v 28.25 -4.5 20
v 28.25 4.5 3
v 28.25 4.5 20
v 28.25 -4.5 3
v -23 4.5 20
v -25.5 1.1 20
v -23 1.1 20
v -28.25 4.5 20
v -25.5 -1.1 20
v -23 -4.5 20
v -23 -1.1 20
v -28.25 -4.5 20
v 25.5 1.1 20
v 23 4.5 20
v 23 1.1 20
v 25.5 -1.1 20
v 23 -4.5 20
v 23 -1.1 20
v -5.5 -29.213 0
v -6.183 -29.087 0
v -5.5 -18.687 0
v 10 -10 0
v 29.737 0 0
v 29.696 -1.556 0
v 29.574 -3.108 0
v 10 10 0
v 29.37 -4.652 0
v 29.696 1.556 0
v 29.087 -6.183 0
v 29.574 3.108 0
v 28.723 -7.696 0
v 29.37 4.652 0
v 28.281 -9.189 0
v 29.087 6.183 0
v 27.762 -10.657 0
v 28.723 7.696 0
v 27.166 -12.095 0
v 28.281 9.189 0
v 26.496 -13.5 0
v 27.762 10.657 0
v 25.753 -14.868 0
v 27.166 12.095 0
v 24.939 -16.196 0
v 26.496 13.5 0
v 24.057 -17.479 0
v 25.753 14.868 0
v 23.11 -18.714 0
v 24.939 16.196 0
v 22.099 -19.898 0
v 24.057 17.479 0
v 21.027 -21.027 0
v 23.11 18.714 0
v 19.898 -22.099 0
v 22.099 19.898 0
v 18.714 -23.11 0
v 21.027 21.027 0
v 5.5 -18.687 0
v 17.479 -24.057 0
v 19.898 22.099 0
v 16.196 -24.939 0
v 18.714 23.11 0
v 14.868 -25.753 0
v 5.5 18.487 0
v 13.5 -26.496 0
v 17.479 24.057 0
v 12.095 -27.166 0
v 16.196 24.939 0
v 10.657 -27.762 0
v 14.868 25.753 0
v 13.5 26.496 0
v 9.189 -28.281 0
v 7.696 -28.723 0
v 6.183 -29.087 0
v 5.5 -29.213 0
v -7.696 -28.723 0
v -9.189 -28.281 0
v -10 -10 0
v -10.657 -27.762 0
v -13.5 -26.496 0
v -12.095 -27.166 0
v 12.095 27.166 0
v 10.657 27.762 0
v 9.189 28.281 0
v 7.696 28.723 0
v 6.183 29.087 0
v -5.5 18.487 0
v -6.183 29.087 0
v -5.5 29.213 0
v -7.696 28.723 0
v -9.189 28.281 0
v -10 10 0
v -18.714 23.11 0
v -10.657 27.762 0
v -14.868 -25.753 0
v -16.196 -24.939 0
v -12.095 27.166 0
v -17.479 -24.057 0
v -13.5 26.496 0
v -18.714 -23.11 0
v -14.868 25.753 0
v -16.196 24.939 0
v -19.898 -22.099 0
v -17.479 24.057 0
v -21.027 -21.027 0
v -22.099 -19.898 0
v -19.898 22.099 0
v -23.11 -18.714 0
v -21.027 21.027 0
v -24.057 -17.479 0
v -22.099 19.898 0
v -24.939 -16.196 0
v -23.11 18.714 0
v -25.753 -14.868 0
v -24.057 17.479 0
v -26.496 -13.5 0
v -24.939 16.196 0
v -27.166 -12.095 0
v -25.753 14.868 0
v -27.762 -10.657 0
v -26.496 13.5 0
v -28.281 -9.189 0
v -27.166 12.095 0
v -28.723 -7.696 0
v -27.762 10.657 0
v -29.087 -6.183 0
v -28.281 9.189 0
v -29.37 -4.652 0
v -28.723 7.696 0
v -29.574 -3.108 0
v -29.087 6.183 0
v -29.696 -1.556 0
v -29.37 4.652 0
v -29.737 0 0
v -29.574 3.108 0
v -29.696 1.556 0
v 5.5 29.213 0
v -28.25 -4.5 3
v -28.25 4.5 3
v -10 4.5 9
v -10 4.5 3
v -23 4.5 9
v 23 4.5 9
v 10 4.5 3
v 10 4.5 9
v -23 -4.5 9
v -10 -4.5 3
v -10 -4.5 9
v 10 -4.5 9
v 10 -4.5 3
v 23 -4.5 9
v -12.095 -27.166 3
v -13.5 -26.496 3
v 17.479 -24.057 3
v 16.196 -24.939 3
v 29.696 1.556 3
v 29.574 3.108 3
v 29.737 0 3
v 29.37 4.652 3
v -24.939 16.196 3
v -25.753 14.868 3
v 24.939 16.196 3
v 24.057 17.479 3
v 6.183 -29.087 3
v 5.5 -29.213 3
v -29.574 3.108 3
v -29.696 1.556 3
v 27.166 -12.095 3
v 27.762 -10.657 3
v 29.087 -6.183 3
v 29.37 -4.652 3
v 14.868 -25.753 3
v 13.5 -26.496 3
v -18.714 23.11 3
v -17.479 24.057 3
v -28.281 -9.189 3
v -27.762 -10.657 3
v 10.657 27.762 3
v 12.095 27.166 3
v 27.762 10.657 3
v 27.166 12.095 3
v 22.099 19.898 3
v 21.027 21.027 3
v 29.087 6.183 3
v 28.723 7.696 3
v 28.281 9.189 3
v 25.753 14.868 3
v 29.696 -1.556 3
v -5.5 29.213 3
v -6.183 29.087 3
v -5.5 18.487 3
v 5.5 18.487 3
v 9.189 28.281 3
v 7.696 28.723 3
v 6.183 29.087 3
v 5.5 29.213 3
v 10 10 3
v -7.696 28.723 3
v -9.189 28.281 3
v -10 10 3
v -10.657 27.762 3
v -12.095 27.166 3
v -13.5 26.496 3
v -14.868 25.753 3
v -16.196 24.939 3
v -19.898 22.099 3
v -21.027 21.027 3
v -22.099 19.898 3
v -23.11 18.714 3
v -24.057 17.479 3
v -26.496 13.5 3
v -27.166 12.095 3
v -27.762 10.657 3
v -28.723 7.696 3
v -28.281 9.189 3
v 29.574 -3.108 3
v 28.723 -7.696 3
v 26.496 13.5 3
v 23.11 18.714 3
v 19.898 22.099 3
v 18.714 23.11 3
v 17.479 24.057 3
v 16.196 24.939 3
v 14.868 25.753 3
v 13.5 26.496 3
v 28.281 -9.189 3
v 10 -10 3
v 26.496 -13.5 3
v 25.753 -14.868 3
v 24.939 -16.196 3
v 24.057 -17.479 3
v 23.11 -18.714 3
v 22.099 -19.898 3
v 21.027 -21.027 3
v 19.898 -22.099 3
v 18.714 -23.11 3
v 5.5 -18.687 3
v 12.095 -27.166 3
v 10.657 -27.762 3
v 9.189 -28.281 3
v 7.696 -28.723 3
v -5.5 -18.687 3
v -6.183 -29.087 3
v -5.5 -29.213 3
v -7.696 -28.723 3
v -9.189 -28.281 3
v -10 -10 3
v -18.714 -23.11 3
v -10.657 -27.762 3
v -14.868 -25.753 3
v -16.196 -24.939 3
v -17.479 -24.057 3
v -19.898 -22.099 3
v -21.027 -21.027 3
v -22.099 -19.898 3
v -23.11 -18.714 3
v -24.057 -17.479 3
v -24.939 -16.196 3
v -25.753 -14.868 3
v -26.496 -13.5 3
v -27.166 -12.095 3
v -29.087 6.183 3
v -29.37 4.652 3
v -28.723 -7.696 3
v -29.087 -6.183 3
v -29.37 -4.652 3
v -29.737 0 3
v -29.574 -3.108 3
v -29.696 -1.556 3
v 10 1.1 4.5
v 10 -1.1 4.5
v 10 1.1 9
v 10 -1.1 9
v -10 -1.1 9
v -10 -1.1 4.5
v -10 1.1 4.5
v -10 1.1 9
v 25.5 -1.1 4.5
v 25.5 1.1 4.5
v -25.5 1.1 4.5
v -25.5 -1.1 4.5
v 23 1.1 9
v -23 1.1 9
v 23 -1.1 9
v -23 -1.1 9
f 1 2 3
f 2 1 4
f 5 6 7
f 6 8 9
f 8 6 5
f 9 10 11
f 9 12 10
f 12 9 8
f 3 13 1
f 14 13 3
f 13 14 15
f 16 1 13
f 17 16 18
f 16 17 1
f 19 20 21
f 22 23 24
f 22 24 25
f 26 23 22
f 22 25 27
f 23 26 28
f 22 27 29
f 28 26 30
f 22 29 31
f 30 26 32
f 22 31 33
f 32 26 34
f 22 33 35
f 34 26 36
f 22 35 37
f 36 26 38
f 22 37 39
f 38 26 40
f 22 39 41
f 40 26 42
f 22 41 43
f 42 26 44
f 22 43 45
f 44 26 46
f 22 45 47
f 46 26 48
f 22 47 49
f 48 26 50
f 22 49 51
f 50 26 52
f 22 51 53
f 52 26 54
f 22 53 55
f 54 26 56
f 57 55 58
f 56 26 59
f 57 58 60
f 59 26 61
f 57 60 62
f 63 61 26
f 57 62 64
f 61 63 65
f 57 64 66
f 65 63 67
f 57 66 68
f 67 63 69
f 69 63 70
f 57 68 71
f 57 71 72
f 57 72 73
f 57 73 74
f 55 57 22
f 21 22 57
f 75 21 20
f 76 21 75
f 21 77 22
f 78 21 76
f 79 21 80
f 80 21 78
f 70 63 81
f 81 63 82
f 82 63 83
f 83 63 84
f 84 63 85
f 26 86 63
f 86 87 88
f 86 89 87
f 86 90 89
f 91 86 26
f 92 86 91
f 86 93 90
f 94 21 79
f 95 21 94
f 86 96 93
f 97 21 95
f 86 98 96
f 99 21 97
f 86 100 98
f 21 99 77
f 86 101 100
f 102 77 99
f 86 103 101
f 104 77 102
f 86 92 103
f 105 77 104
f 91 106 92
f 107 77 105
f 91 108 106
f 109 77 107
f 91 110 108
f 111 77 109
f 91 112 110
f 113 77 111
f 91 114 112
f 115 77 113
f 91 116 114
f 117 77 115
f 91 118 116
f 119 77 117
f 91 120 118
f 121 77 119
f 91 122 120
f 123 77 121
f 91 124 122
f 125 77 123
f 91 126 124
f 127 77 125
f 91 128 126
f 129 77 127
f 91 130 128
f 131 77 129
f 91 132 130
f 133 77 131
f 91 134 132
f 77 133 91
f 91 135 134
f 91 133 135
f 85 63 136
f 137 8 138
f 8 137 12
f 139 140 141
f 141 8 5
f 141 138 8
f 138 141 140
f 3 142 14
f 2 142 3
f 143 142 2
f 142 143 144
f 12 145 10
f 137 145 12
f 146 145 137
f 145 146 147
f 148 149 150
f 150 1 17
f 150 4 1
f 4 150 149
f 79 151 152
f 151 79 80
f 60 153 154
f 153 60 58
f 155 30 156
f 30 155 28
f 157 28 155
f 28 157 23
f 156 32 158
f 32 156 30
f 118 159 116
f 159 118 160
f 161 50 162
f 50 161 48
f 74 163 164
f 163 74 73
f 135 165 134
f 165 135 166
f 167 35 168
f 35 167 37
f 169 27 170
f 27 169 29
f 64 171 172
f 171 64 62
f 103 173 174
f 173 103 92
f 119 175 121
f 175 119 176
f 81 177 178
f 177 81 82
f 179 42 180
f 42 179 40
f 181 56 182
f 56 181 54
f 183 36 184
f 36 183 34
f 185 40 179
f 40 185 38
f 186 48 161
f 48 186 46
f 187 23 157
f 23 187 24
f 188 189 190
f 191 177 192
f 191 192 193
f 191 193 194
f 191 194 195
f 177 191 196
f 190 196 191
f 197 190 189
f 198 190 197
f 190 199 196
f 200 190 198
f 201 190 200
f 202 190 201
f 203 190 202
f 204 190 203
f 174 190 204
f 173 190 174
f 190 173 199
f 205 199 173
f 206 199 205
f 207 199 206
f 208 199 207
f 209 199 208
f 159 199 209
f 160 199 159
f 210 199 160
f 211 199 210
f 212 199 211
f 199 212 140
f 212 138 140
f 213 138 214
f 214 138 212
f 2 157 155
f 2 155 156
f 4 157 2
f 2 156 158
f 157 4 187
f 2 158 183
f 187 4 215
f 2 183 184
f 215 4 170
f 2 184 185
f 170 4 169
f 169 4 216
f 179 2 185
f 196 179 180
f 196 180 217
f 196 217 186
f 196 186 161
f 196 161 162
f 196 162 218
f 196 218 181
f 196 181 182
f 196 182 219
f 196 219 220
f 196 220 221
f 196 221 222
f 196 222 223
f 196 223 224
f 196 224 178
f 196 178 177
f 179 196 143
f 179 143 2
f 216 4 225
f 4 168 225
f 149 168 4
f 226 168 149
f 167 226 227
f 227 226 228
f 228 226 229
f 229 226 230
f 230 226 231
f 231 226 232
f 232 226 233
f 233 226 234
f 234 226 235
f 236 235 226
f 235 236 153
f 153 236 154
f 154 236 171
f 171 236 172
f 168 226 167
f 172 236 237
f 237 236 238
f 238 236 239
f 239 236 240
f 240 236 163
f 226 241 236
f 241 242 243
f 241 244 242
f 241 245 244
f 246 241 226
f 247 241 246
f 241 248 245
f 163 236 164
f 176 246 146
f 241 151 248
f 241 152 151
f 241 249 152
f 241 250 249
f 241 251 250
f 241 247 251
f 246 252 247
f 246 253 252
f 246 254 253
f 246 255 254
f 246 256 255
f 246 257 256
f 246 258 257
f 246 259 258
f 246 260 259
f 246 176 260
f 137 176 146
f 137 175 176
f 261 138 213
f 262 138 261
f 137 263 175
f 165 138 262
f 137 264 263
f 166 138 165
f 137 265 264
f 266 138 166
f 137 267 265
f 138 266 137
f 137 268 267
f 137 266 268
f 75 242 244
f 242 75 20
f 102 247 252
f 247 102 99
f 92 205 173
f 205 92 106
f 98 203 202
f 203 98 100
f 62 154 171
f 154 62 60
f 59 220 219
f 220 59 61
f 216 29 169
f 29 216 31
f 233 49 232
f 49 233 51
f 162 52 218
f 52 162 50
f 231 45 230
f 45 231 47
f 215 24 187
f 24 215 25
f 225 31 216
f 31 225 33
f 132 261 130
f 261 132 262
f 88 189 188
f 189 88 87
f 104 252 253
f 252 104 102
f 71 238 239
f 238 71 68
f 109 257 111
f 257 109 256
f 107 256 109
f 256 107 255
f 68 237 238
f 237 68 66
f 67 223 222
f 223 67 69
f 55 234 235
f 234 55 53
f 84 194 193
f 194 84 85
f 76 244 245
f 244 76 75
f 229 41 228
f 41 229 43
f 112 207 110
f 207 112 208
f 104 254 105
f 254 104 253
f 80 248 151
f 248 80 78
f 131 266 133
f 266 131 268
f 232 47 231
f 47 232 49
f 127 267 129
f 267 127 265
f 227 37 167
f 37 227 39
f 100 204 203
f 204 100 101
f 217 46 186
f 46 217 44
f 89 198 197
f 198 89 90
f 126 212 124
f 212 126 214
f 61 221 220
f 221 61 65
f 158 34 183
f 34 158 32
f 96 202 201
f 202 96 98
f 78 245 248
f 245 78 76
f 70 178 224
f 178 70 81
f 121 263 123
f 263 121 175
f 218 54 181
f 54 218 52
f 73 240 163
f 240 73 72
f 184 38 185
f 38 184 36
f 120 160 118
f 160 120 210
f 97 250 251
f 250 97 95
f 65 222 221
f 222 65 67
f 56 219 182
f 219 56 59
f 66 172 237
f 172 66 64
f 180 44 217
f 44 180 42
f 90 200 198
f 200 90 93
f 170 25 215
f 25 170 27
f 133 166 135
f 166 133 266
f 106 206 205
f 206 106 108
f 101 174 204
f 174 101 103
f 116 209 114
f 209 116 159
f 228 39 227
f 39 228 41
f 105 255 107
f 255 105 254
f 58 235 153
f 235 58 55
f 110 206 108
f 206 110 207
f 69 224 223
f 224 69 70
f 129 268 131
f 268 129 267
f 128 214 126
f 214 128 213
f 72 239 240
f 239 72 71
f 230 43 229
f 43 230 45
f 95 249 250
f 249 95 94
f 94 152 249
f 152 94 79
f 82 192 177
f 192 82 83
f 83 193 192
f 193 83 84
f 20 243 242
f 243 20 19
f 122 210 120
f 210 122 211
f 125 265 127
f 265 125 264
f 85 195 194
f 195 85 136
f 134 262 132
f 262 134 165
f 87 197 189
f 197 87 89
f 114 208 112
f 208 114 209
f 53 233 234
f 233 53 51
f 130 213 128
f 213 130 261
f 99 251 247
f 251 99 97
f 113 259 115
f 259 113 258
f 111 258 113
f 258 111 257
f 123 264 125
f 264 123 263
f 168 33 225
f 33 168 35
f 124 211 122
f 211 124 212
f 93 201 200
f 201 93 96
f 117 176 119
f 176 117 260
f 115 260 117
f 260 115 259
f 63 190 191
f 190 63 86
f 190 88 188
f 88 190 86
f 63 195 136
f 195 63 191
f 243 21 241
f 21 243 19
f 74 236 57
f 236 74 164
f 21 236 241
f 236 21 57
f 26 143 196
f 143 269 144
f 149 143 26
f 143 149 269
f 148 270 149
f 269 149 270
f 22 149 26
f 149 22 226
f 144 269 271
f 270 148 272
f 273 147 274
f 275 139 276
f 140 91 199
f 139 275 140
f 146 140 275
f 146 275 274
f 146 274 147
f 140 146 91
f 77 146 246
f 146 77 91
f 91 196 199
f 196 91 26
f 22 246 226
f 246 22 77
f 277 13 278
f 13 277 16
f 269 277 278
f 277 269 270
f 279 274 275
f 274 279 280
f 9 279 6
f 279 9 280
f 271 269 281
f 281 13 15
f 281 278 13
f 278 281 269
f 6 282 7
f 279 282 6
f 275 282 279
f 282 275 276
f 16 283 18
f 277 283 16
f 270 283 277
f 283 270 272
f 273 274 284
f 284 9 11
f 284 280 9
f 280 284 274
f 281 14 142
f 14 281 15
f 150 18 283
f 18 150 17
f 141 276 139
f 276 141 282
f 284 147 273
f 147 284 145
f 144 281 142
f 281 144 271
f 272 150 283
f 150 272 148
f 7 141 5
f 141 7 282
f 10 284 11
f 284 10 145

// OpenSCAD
// Parametric Haack Series or Ogive Nose Cone
// 2 or 3 piece with removable tip and sleeve
//
//  by Jonathan Nobels, 2017
//
//  I dedicate any and all copyright interest in this software to the public domain.
//  I make this dedication for the benefit of the public at large and to the
//  detriment of my heirs and successors. I intend this dedication to be an overt
//  act of relinquishment in perpetuity of all present and future rights to this
//  software under copyright law. See <http://unlicense.org> for more info.
//


$fn=120;

// 1.5" Mailing Tube
//TUBE_ID = 38.2;
//TUBE_OD = 41.2;

// 2.5" Mailing Tube
//TUBE_ID = 63.65;
//TUBE_OD = 66.90;  

// 3.0" Mailing Tube 
//TUBE_ID = 75.75;
//TUBE_OD = 78.75;

//Rocketarium thick wall 2.2" Tube
//OD.: 2.26. I.D.: 2.14
//TUBE_OD = 2.26 *25.4;
//TUBE_ID = 2.14 *25.4;

//Rocketarium thick wall 2.5" Tube
//O.D.: 2.638. I.D.: 2.558
TUBE_OD = 2.638 *25.4;
TUBE_ID = 2.558 *25.4;

//BT80: OD: 2.6" ID: 2.558"
//BT60: ID: 1.595", OD: 1.637
//BT50 ID: 0.95", OD: 0.976" 


LENGTH = 80;             //Overall length
TIP_LEN=40;               //Length of the removable tip 
TIP_RAD=4;                //Tip radiums
SHOULDER_LENGTH = 170;     //Length of the insert 

 //The radii and lengths here have to be customized for each length/od
 //Deriving the raduis at a given z position is left as an exercise for
 //the reader.
SLEEVE_OR=13.4;             //Tip insery sleeve outer radius
SLEEVE_IR=10;               //Tip insert sleeve inner radius
SLEEVE_LEN=20;              //Tip sleeve length
    
WALL_THICKNESS = 2.0;       //Cone and sleeve wall thickness

//Cone styles
PARABOLIC=1;
OGIVE=2;
HAACK=3;
ELLIPTICAL=4;

STYLE = ELLIPTICAL;

//Build the components - Uncomment the ones you need
//shelled_cone();
//translate([0,0,0])
//cone_bottom();
//translate([TUBE_OD/2 + 20,0,0])
//cone_tip();
//translate([-TUBE_OD - 20,0,0])
//translate([0,0,3.5])
//avbay_insert();
//bulkhead();
//simple_insert();
avbay_retainer();

// Components
module bulkhead()
{
  difference() {
    union(){
        cylinder(r=TUBE_ID/2, h=3.5, center=false);
        cylinder(r=TUBE_ID/2-WALL_THICKNESS-.1, h=6.0, center=false);
    }
    cylinder(r=1.5, h=20, center=true);
    for(x = [-TUBE_ID/2+8, TUBE_ID/2-8]) {
      translate([x,0,0]) {
       cylinder(r=3.0, h=20, center=true);
      }
    }
  }
}


module simple_insert()
{
  union(){
    difference(){
      cylinder(r=TUBE_ID/2, h=SHOULDER_LENGTH, center=false);
      cylinder(r=TUBE_ID/2-WALL_THICKNESS, h=(SHOULDER_LENGTH)*2.1, center=true);
    }
  }
}

module avbay_insert()
{
  union(){
    difference() {
      cylinder(r=TUBE_ID/2, h=SHOULDER_LENGTH, center=false);
      cylinder(r=TUBE_ID/2-WALL_THICKNESS, h=(SHOULDER_LENGTH)*2.1, center=true);
    }
    difference() {
      union() {
        translate([TUBE_ID/2-WALL_THICKNESS-11,-5,3.5]) {
            cube([12,10,14]);
        }
        translate([-TUBE_ID/2+WALL_THICKNESS-1,-5,3.5]) {
            cube([12,10,14]);
        }
      }
      for(x = [-TUBE_ID/2+8, TUBE_ID/2-8]) {
        translate([x,0,0]) {
         cylinder(r=3.0, h=70, center=true);
        }
      }
    }
  }  
}



module avbay_retainer()
{
  or = TUBE_ID / 2 - WALL_THICKNESS - .75;
  ir = or * .45;

  difference() {
    union() {
        translate([0,0,10]) {
          cube([or*1.9,9,20], center = true);
      }
      cylinder(h=3, r=or, center=false);
      
    }
    rotate([0,0,90])translate([TUBE_ID/2-WALL_THICKNESS-12,-5.5,-1]) {
        cube([12.8,11,24]);
    }
    rotate([0,0,90])translate([-TUBE_ID/2+WALL_THICKNESS-1,-5.5,-1]) {
         cube([12.8,11,24]);
    }
    translate([0,0,-1]) {
      //cylinder(h=50, r=ir, center=true);
      cube(size = [20,20,40], center=true);
    }
    translate([0,0,17])
     cube([51,2.2,25], center = true);
    translate([0,0,23]) 
       cube([46,40,28], center = true);
  }   
}

module solid_cone()
{
  if(STYLE == ELLIPTICAL) {
      cone_elliptical(R = TUBE_OD/2, L=LENGTH, s=520);
  }
  if(STYLE == OGIVE) {
      cone_ogive_tan_blunted(R = TUBE_OD/2, R_nose = TIP_RAD, L = LENGTH, s = 520);
  }
  if(STYLE == PARABOLIC) {
      cone_parabolic(R = TUBE_OD/2, L=LENGTH, s=520);
  }
  if(STYLE == HAACK){
      cone_haack(R = TUBE_OD/2, L = LENGTH, s = 200, R_nose=TIP_RAD);   
  }
}

module shelled_cone() 
{
  difference() {
  if(STYLE == ELLIPTICAL) {
   cone_elliptical(R = TUBE_OD/2, L=LENGTH, s=180);
   cone_elliptical(R = TUBE_OD/2 - WALL_THICKNESS, L=LENGTH-WALL_THICKNESS, s=180);
  }
  if(STYLE == OGIVE) {
   cone_ogive_tan_blunted(R = TUBE_OD/2, R_nose = TIP_RAD, L = LENGTH, s = 180);
   cone_ogive_tan_blunted(R= TUBE_OD/2- WALL_THICKNESS, R_nose = TIP_RAD, L = LENGTH*.96, s = 180);
  }
  if(STYLE == PARABOLIC) {
   cone_parabolic(R = TUBE_OD/2, L=LENGTH, s=100);
   cone_parabolic(R = TUBE_OD/2 - WALL_THICKNESS, L=LENGTH-WALL_THICKNESS, s=100);
  }
  if(STYLE == HAACK){
    cone_haack(R = TUBE_OD/2, L = LENGTH, s = 200, R_nose=TIP_RAD);
    cone_haack(R = TUBE_OD/2 - WALL_THICKNESS, L = LENGTH-WALL_THICKNESS, s = 180);
  }
  
  //Cut out inner sleeve
  cylinder(r=TUBE_ID/2, h = 20, center=true);
  }
}

module cone_bottom()
{  
  difference() {
    union() {
      shelled_cone();
      translate([0,0,LENGTH-TIP_LEN-SLEEVE_LEN]) difference(){
        cylinder(r=SLEEVE_OR,h=SLEEVE_LEN*2, center=false);
        cylinder(r=SLEEVE_IR,h=SLEEVE_LEN*4, center=true);
      }
    }
    translate([-SLEEVE_OR*2.5,-SLEEVE_OR*2.5,LENGTH-TIP_LEN])cube([SLEEVE_OR*5,SLEEVE_OR*5,TIP_LEN*2]);
  }
}

module cone_tip()
{ 
  translate([0,0,-(LENGTH-TIP_LEN-SLEEVE_LEN)])
  union() {
  difference() {
    solid_cone();
    translate([-TUBE_OD,-TUBE_OD,0])cube([TUBE_OD*2,TUBE_OD*2,LENGTH-TIP_LEN]);
  }
  translate([0,0,LENGTH-TIP_LEN-SLEEVE_LEN])
    cylinder(r=SLEEVE_IR-.4,h=SLEEVE_LEN, center=false);
  }
}

module cone_haack(C = 0, R = 5, L = 10, s = 100)
{
  // SEARS-HAACK BODY NOSE CONE:
  //
  // Parameters:
  // C = 1/3: LV-Haack (minimizes supersonic drag for a given L & V)
  // C = 0: LD-Haack (minimizes supersonic drag for a given L & D), also referred to as Von Kármán
  //
  // Formulae (radians):
  // theta = acos(1 - (2 * x / L));
  // y = (R / sqrt(PI)) * sqrt(theta - (sin(2 * theta) / 2) + C * pow(sin(theta),3));

  echo(str("SEARS-HAACK BODY NOSE CONE"));
  echo(str("C = ", C)); 
  echo(str("R = ", R)); 
  echo(str("L = ", L)); 
  echo(str("s = ", s)); 

  TORAD = PI/180;
  TODEG = 180/PI;

  inc = 1/s;

  rotate_extrude(convexity = 10, $fn = s)
    for (i = [1 : s]){
        x_last = L * (i - 1) * inc;
        x = L * i * inc;

        theta_last = TORAD * acos((1 - (2 * x_last/L)));
        y_last = (R/sqrt(PI)) * sqrt(theta_last - (sin(TODEG * (2*theta_last))/2) + C * pow(sin(TODEG * theta_last), 3));

        theta = TORAD * acos(1 - (2 * x/L));
        y = (R/sqrt(PI)) * sqrt(theta - (sin(TODEG * (2 * theta)) / 2) + C * pow(sin(TODEG * theta), 3));

        rotate([0, 0, -90]) polygon(points = [[x_last - L, 0], [x - L, 0], [x - L, y], [x_last - L, y_last]], convexity = 10);
    }
}
  
  

module cone_ogive_tan_blunted(R_nose = 2, R = 5, L = 10, s = 500)
{
    // SPHERICALLY BLUNTED TANGENT OGIVE
    //
    //
    
    echo(str("SPHERICALLY BLUNTED TANGENT OGIVE"));    
    echo(str("R_nose = ", R_nose)); 
    echo(str("R = ", R)); 
    echo(str("L = ", L)); 
    echo(str("s = ", s)); 
    
    rho = (pow(R,2) + pow(L,2)) / (2*R);
    
    x_o = L - sqrt(pow((rho - R_nose), 2) - pow((rho - R), 2));
    x_a = x_o - R_nose;
    y_t = (R_nose * (rho - R)) / (rho - R_nose);
    x_t = x_o - sqrt(pow(R_nose, 2)- pow(y_t, 2));
    
    TORAD = PI/180;
    TODEG = 180/PI;
        
    inc = 1/s;
        
    s_x_t = round((s * x_t) / L);
    
    alpha = TORAD * atan(R/L) - TORAD * acos(sqrt(pow(L,2) + pow(R,2)) / (2*rho));
    
    rotate_extrude(convexity = 10, $fn = s) union(){
        for (i=[s_x_t:s]){
    
            x_last = L * (i - 1) * inc;
            x = L * i * inc;
    
            y_last = sqrt(pow(rho,2) - pow((rho * cos(TODEG * alpha) - x_last),2)) + (rho * sin(TODEG * alpha));
    
            y = sqrt(pow(rho,2) - pow((rho * cos(TODEG * alpha) - x),2)) + (rho * sin(TODEG * alpha));
    
            rotate([0,0,-90])polygon(points = [[x_last-L,0],[x-L,0],[x-L,y],[x_last-L,y_last]], convexity = 10);
        }
    
        translate([0, L - x_o, 0]) difference(){
            circle(R_nose, $fn = s);
            translate([-R_nose, 0, 0]) square((2 * R_nose), center = true);
        }
    }
}  

module cone_parabolic(R = 5, L = 10, K = 1, s = 500)
{
// PARABOLIC NOSE CONE
//
// Formula: y = R * ((2 * (x / L)) - (K * pow((x / L),2)) / (2 - K);
//
// Parameters:
// K = 0 for cone
// K = 0.5 for 1/2 parabola
// K = 0.75 for 3/4 parabola
// K = 1 for full parabola

echo(str("PARABOLIC NOSE CONE"));
echo(str("R = ", R)); 
echo(str("L = ", L)); 
echo(str("K = ", K)); 
echo(str("s = ", s)); 
    
if (K >= 0 && K <= 1){

    inc = 1/s;

    rotate_extrude(convexity = 10, $fn = s)
    for (i = [1 : s]){
        
        x_last = L * (i - 1) * inc;
        x = L * i * inc;

        y_last = R * ((2 * ((x_last)/L)) - (K * pow(((x_last)/L), 2))) / (2 - K);
        y = R * ((2 * (x/L)) - (K * pow((x/L), 2))) / (2 - K);

        polygon(points = [[y_last, 0], [y, 0], [y, L - x], [y_last, L - x_last]], convexity = 10);
    }
} else echo(str("ERROR: K = ", K, ", but K must fall between 0 and 1 (inclusive)."));
}

module cone_elliptical(n = 0.5, R = 5, L = 10, s = 500){
// ELLIPTICAL NOSE CONE:
//
// Formula: y = R * sqrt(1 - pow((x / L), 2));

echo(str("ELLIPTICAL NOSE CONE"));    
echo(str("n = ", n)); 
echo(str("R = ", R)); 
echo(str("L = ", L)); 
echo(str("s = ", s)); 

inc = 1/s;

rotate_extrude(convexity = 10, $fn = s)
for (i = [1 : s]){

    x_last = L * (i - 1) * inc;
    x = L * i * inc;

    y_last = R * sqrt(1 - pow((x_last/L), 2));
    y = R * sqrt(1 - pow((x/L), 2));

    rotate([0,0,90]) polygon(points = [[0, y_last], [0, y], [x, y], [x_last, y_last]], convexity = 10);
}
}
  
